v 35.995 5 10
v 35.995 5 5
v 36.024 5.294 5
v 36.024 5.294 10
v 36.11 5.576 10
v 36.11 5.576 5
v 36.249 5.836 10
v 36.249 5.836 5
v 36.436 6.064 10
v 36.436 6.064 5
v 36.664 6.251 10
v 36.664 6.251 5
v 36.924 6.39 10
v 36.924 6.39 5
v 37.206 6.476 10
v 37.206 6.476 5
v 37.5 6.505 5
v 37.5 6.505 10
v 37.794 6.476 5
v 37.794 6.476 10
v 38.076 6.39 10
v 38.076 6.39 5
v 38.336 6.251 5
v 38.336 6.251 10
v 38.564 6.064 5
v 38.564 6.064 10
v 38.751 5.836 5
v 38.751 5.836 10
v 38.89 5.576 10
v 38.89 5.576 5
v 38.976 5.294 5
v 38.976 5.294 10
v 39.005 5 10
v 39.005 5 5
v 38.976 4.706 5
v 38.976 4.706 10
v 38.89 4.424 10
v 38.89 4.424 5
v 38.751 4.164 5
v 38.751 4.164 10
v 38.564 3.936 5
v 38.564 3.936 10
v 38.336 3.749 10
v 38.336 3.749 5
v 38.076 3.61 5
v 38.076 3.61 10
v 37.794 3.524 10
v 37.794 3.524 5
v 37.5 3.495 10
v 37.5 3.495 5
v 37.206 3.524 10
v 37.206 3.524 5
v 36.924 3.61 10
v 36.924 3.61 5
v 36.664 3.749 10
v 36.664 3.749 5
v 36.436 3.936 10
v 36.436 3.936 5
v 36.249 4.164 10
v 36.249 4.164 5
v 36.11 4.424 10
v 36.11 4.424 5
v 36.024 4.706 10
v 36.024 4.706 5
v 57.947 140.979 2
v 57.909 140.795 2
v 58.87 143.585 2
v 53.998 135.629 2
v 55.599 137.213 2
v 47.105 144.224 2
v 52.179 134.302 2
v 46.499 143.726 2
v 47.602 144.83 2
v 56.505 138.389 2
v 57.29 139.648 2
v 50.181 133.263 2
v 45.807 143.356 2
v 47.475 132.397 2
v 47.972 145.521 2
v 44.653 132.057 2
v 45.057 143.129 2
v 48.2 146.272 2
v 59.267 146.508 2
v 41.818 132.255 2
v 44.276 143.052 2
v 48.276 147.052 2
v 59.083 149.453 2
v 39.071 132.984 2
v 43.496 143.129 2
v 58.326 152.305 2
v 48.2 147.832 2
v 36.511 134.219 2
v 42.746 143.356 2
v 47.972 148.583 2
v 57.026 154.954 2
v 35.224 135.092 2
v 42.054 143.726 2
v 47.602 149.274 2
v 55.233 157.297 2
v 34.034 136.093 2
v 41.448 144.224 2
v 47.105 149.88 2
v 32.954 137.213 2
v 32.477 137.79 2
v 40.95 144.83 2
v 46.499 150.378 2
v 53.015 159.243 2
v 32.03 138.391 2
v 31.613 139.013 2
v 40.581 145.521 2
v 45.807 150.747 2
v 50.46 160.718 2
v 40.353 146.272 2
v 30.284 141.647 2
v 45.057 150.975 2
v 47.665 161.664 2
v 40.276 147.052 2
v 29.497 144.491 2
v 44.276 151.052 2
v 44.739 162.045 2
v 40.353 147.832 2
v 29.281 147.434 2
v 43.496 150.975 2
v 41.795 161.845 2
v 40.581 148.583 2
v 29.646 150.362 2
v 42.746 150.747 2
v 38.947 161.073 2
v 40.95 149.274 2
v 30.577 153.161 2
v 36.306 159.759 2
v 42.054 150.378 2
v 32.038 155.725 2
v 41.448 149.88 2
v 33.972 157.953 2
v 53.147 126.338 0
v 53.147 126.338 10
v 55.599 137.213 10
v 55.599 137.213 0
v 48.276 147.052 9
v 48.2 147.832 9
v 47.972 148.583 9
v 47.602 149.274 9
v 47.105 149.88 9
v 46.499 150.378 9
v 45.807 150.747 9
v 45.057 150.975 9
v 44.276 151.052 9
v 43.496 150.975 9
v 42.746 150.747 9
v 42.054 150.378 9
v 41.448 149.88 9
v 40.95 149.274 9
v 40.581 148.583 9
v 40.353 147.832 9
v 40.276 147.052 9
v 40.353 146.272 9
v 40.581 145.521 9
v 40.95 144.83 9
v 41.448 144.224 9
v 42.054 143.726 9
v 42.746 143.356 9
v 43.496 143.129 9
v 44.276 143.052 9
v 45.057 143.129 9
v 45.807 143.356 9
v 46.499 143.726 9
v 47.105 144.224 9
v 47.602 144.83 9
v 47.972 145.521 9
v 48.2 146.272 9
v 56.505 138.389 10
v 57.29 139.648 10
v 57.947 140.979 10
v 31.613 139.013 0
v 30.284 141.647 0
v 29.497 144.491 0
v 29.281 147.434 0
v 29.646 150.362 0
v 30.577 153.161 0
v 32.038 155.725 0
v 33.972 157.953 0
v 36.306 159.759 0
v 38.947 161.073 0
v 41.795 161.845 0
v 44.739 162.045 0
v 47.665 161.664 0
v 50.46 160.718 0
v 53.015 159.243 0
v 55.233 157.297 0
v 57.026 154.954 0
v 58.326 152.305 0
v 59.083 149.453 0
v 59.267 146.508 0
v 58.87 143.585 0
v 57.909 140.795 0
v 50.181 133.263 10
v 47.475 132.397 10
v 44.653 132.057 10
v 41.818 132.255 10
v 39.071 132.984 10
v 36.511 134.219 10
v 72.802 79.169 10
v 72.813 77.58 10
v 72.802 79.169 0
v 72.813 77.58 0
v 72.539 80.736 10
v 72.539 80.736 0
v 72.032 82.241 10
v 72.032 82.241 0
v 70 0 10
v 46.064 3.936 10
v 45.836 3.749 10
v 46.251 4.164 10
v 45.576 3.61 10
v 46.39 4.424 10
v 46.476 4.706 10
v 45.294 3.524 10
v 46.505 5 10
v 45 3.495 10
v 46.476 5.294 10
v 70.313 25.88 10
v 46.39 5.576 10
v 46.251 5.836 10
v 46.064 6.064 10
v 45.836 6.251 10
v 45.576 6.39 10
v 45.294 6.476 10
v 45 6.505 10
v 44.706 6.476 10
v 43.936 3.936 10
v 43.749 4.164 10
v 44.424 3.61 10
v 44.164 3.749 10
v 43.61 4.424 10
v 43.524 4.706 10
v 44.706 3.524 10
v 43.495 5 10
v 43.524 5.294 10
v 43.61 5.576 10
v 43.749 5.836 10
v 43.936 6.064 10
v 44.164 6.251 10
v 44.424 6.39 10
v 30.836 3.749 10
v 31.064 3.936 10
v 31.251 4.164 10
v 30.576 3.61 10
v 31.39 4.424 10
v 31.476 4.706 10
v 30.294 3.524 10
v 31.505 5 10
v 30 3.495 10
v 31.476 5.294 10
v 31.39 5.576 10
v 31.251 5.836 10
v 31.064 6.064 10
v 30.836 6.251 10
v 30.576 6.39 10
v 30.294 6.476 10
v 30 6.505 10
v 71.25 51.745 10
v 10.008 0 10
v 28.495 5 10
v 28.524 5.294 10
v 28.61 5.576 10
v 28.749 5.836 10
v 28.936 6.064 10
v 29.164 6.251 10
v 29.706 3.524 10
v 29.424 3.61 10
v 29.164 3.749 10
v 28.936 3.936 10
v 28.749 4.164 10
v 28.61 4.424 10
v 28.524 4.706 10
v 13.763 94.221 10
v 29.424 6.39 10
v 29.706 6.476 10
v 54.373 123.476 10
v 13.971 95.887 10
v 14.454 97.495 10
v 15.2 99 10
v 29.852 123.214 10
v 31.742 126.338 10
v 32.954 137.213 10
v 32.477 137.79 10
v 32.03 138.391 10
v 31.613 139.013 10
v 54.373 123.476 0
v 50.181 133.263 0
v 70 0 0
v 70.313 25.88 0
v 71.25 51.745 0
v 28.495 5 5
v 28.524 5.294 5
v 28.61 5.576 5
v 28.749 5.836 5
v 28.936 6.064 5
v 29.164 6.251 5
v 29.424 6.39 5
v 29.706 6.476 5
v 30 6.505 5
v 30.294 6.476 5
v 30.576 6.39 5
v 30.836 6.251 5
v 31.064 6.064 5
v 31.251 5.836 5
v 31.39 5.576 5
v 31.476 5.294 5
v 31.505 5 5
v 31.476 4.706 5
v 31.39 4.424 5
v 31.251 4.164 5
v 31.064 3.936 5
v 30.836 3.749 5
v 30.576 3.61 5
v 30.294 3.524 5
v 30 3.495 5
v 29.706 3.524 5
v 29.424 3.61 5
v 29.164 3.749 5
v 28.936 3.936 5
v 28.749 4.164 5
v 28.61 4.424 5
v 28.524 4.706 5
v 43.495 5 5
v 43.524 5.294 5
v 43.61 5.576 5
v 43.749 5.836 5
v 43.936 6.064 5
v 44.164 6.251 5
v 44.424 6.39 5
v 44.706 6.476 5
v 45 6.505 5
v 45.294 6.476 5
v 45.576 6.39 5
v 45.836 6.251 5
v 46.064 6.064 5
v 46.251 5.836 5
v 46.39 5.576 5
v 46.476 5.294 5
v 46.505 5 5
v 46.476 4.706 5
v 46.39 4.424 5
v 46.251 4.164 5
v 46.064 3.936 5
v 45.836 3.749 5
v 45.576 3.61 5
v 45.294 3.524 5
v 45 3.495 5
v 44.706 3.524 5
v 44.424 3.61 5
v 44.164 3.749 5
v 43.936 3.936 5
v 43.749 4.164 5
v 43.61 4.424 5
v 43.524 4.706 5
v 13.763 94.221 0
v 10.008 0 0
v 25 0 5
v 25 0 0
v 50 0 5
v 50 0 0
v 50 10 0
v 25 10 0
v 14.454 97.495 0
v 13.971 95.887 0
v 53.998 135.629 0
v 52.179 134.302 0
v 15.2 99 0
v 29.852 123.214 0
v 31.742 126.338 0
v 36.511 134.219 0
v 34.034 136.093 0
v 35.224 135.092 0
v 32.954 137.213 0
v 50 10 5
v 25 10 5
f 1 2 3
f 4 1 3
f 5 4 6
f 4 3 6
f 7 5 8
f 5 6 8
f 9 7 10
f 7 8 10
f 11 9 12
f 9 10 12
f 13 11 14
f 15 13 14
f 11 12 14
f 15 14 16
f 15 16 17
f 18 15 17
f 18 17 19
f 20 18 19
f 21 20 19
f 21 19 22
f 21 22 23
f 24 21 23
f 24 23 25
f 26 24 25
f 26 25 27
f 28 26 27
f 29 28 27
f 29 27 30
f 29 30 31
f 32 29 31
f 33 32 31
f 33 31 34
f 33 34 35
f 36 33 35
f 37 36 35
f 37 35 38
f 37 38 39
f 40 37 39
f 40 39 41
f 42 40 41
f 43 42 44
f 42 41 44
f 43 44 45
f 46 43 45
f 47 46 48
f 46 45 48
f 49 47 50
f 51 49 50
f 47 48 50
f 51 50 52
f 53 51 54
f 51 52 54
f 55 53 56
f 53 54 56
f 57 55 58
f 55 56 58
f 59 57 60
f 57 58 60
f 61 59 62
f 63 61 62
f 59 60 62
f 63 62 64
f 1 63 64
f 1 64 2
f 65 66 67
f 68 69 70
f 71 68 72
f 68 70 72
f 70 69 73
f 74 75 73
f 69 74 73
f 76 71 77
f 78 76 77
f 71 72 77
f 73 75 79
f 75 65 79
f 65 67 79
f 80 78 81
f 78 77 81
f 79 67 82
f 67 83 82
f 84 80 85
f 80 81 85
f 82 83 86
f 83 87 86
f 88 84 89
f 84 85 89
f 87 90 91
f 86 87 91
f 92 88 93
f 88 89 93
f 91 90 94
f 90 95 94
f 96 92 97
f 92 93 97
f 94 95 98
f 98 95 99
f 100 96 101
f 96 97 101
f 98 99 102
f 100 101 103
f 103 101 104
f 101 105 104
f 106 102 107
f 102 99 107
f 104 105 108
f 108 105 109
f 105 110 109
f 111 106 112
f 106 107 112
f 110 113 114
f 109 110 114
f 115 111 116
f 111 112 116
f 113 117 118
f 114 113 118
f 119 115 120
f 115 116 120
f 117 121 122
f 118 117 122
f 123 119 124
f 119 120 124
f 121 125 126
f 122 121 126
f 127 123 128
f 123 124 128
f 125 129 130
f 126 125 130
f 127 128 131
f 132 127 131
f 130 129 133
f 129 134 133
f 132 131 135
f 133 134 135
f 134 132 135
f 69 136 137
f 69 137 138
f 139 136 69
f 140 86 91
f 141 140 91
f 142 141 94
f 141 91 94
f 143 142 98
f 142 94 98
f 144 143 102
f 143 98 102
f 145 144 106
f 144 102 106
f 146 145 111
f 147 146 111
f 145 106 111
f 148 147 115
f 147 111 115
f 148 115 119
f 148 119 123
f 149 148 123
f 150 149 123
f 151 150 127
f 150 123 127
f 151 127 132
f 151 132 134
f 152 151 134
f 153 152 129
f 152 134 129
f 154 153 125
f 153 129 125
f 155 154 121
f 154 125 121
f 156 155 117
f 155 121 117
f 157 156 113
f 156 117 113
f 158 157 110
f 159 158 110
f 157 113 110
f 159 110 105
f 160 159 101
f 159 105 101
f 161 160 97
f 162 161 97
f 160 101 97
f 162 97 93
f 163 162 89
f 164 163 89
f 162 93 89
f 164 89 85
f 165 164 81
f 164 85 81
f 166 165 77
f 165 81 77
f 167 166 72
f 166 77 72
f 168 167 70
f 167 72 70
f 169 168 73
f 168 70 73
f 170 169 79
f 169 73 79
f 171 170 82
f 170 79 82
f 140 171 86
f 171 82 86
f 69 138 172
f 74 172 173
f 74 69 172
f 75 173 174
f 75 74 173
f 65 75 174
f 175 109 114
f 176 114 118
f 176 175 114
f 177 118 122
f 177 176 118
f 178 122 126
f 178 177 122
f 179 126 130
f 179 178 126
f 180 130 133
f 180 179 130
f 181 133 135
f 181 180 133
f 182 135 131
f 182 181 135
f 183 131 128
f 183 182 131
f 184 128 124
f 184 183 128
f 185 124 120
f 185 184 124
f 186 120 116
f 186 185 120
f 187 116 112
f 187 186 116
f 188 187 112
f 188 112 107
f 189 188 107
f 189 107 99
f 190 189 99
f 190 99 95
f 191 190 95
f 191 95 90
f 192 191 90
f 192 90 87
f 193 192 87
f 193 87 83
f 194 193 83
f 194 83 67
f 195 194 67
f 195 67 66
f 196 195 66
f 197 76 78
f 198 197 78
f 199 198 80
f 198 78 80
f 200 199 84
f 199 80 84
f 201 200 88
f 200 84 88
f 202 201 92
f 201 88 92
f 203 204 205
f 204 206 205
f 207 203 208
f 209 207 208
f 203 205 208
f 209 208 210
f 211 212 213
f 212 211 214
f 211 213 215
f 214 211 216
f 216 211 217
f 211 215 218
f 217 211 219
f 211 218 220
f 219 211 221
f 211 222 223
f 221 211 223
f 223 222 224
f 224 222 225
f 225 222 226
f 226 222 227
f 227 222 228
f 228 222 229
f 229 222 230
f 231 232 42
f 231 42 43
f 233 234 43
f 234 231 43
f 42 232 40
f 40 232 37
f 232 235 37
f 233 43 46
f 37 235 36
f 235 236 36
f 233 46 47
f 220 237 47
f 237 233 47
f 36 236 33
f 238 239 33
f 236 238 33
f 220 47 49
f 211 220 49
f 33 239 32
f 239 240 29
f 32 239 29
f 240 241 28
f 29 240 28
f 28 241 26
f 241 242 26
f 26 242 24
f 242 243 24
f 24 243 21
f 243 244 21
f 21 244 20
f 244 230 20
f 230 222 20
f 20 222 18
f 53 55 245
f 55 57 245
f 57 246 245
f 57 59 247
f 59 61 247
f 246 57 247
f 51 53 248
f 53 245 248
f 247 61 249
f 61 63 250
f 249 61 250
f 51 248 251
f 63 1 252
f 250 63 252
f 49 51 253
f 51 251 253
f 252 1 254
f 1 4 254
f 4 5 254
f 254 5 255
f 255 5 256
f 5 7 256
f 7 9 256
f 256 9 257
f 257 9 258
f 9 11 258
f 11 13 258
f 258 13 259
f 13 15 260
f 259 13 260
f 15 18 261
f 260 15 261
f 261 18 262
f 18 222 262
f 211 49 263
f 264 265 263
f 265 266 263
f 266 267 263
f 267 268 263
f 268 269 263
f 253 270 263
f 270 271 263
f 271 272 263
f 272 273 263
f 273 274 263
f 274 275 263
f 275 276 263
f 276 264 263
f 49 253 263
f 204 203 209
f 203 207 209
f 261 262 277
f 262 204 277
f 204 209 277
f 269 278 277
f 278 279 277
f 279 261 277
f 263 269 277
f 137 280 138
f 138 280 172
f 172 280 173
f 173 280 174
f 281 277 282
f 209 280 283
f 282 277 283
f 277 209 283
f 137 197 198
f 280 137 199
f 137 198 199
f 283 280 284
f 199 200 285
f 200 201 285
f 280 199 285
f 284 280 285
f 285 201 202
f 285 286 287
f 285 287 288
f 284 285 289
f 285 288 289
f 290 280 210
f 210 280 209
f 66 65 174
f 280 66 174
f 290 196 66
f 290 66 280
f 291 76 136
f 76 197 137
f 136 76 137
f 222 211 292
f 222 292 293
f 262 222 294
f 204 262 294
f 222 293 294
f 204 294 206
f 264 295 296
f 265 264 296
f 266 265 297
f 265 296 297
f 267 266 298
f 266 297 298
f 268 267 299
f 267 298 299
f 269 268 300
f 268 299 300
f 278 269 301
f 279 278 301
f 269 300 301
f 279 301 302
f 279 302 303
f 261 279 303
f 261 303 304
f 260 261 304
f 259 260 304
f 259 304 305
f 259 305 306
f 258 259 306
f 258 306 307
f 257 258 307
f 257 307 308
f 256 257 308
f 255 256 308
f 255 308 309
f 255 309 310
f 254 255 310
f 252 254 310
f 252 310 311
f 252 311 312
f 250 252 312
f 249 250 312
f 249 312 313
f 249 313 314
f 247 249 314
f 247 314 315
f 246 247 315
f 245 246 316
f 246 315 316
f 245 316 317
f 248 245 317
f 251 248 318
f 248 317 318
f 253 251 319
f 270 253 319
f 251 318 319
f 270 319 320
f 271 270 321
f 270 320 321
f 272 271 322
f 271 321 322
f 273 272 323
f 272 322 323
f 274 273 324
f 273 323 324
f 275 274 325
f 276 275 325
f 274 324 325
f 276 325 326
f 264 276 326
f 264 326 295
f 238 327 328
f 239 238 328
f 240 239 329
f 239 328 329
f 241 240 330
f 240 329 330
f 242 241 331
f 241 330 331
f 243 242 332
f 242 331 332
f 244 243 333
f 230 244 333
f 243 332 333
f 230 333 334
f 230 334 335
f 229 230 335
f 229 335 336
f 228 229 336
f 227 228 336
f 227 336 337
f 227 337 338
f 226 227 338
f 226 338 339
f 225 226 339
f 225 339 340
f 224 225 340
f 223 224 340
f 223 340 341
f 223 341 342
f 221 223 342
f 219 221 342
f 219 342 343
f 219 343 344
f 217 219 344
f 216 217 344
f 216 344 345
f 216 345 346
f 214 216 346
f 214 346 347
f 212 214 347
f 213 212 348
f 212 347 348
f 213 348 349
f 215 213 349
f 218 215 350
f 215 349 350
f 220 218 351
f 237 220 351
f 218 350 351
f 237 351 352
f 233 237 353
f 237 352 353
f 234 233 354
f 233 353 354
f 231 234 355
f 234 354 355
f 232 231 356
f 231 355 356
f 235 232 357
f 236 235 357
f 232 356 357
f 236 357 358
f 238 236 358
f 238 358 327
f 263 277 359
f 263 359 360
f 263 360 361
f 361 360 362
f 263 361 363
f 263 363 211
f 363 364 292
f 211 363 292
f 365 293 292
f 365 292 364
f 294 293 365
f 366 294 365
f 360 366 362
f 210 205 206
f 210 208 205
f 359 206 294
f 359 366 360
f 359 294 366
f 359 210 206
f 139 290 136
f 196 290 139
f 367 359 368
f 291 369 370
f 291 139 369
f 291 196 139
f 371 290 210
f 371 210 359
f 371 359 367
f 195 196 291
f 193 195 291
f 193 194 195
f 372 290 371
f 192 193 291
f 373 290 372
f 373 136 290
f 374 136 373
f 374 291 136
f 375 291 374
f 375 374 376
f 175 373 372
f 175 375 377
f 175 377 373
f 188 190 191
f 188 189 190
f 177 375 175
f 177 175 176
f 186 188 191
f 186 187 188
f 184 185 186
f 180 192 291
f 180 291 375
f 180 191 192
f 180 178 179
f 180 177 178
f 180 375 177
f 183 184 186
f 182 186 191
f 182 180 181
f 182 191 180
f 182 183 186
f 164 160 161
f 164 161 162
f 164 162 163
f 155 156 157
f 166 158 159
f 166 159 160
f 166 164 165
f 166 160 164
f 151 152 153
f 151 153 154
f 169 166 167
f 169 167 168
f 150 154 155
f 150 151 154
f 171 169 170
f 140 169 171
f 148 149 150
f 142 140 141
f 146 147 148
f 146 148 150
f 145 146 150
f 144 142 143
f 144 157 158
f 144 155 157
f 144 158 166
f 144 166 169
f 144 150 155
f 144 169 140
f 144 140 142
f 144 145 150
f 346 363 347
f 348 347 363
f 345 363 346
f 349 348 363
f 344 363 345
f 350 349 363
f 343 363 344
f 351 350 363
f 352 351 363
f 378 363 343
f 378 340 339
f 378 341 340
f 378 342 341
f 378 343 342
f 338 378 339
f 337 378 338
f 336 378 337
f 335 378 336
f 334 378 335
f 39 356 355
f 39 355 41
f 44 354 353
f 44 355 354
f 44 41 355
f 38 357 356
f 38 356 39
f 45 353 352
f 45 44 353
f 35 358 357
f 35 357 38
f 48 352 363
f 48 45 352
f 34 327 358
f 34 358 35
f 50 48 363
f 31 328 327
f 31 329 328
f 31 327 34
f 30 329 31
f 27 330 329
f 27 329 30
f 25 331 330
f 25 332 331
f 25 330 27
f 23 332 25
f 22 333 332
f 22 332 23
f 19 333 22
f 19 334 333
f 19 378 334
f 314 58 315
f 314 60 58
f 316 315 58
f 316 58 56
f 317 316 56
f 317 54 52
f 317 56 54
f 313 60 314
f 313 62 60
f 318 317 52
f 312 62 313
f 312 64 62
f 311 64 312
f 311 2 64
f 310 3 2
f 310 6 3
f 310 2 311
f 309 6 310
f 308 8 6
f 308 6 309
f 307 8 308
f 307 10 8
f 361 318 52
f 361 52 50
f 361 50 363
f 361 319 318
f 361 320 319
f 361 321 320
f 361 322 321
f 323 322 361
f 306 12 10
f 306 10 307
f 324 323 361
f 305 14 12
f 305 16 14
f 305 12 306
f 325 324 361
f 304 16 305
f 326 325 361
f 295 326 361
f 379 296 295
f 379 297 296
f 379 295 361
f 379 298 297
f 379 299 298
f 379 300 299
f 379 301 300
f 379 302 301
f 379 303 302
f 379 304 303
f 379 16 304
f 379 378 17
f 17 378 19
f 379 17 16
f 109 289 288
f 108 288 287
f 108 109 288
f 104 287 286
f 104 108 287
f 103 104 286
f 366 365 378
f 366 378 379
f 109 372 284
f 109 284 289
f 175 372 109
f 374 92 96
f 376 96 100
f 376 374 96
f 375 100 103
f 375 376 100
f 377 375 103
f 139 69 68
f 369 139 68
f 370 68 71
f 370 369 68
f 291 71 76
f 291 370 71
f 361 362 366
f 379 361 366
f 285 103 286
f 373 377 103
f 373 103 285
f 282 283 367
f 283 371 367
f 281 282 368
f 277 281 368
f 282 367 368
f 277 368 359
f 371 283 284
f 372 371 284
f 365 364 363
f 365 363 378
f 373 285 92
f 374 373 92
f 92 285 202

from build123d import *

# Parameters (mm, degrees)
BOSS_EXTRUDE1_DEPTH = 10
CUT_EXTRUDE2_DEPTH  = 10
BOSS_EXTRUDE2_DEPTH = 10
SKETCH7_R           = 15
CUT_EXTRUDE3_DEPTH  = 17
SKETCH8_R           = 15
BOSS_EXTRUDE4_DEPTH = 2
SKETCH10_R          = 4
BOSS_EXTRUDE5_DEPTH = 7
FILLET1_R           = 10
CUT_EXTRUDE4_DEPTH  = 10
FILLET2_R           = 10
SKETCH12_W          = 25
SKETCH12_H          = 10
CUT_EXTRUDE5_DEPTH  = 5
SKETCH13_R          = 1.505
CUT_EXTRUDE6_DEPTH  = 15
BOSS_EXTRUDE6_DEPTH = 10


with BuildPart() as part:
    # Sketch2 → Boss-Extrude1 (new body)
    with BuildSketch(Plane.XY):
        with BuildLine():
            Line((0, 0), (70, 0))
            ThreePointArc((70, 0), (80.047115298, 146.372811683), (110, 290))
            Line((110, 290), (50, 290))
            ThreePointArc((50, 290), (12.591539765, 147.139389696), (0, 0))
        make_face()
    extrude(amount=BOSS_EXTRUDE1_DEPTH)

    # Sketch5 → Cut-Extrude2 (cut)
    with BuildSketch(Plane.XY.offset(10)):
        Polygon((-13.167731947, 80), (152.833861951, 80), (152.833861951, 337.050867126), (18.976855574, 332.054655913), align=None)
    extrude(amount=-CUT_EXTRUDE2_DEPTH, mode=Mode.SUBTRACT)

    # Sketch6 → Boss-Extrude2 (add)
    with BuildSketch(Plane.XY.offset(10)):
        Polygon((72.991341013, 80), (3.703067383, 80), (44.276364493, 147.051943441), align=None)
    extrude(amount=-BOSS_EXTRUDE2_DEPTH)

    # Sketch7 → Cut-Extrude3 (cut)
    with BuildSketch(Plane(origin=(0, 0, 0), x_dir=(-1, 0, 0), z_dir=(0, 0, -1))):
        with Locations((-44.276364493, 147.051943441)):
            Circle(SKETCH7_R)
    extrude(amount=-CUT_EXTRUDE3_DEPTH, mode=Mode.SUBTRACT)

    # Fillet1
    fillet1_edges = [part.edges().sort_by_distance(p)[0] for p in [
        (3.703067383, 80, 5),
        (72.991341013, 80, 5),
    ]]
    fillet(fillet1_edges, radius=FILLET1_R)

    # Sketch11 → Cut-Extrude4 (cut)
    with BuildSketch(Plane.XY.offset(10)):
        Polygon((13.865882816, 96.79519719), (9.525195507, -12.111976015), (-19.82973313, -10.941983603), (-15.53567793, 96.79519719), align=None)
    extrude(amount=-CUT_EXTRUDE4_DEPTH, mode=Mode.SUBTRACT)

    # Fillet2
    fillet2_edges = [part.edges().sort_by_distance(p)[0] for p in [
        (13.865882816, 96.79519719, 5),
    ]]
    fillet(fillet2_edges, radius=FILLET2_R)

    # Sketch12 → Cut-Extrude5 (cut)
    with BuildSketch(Plane(origin=(0, 0, 0), x_dir=(-1, 0, 0), z_dir=(0, 0, -1))):
        with Locations((-37.5, 5)):
            Rectangle(SKETCH12_W, SKETCH12_H)
    extrude(amount=-CUT_EXTRUDE5_DEPTH, mode=Mode.SUBTRACT)

    # Sketch13 → Cut-Extrude6 (cut)
    with BuildSketch(Plane(origin=(0, 0, 5), x_dir=(-1, 0, 0), z_dir=(0, 0, -1))):
        with Locations((-45, 5)):
            Circle(SKETCH13_R)
        with Locations((-37.5, 5)):
            Circle(SKETCH13_R)
        with Locations((-30, 5)):
            Circle(SKETCH13_R)
    extrude(amount=-CUT_EXTRUDE6_DEPTH, mode=Mode.SUBTRACT)



with BuildPart() as body_2:
    # Sketch8 → Boss-Extrude4 (new body)
    with BuildSketch(Plane(origin=(0, 0, 0), x_dir=(-1, 0, 0), z_dir=(0, 0, -1))):
        with Locations((-44.276364493, 147.051943441)):
            Circle(SKETCH8_R)
    extrude(amount=-BOSS_EXTRUDE4_DEPTH)

    # Sketch10 → Boss-Extrude5 (add)
    with BuildSketch(Plane.XY.offset(2)):
        with Locations((44.276364493, 147.051943441)):
            Circle(SKETCH10_R)
    extrude(amount=BOSS_EXTRUDE5_DEPTH)


with BuildPart() as part_1:
    add(part.part)

    add(body_2.part)  # Boss-Extrude6 merges body 2
    # Sketch14 → Boss-Extrude6 (add)
    with BuildSketch(Plane(origin=(0, 0, 0), x_dir=(-1, 0, 0), z_dir=(0, 0, -1))):
        with BuildLine():
            Line((-53.147136244, 126.337927349), (-55.598718025, 137.213025284))
            ThreePointArc((-55.598718025, 137.213025284), (-56.912855269, 139.008842213), (-57.946701254, 140.97939483))
            Line((-57.946701254, 140.97939483), (-54.372927134, 123.47560004))
            Line((-54.372927134, 123.47560004), (-53.147136244, 126.337927349))
        make_face()
        with BuildLine():
            ThreePointArc((-31.612557589, 139.012789587), (-32.24957103, 138.087779286), (-32.954010961, 137.213025284))
            Line((-32.954010961, 137.213025284), (-31.742262033, 126.337927349))
            Line((-31.742262033, 126.337927349), (-29.852240994, 123.214454699))
            Line((-29.852240994, 123.214454699), (-31.612557589, 139.012789587))
        make_face()
    extrude(amount=-BOSS_EXTRUDE6_DEPTH)


solid = part_1.part
